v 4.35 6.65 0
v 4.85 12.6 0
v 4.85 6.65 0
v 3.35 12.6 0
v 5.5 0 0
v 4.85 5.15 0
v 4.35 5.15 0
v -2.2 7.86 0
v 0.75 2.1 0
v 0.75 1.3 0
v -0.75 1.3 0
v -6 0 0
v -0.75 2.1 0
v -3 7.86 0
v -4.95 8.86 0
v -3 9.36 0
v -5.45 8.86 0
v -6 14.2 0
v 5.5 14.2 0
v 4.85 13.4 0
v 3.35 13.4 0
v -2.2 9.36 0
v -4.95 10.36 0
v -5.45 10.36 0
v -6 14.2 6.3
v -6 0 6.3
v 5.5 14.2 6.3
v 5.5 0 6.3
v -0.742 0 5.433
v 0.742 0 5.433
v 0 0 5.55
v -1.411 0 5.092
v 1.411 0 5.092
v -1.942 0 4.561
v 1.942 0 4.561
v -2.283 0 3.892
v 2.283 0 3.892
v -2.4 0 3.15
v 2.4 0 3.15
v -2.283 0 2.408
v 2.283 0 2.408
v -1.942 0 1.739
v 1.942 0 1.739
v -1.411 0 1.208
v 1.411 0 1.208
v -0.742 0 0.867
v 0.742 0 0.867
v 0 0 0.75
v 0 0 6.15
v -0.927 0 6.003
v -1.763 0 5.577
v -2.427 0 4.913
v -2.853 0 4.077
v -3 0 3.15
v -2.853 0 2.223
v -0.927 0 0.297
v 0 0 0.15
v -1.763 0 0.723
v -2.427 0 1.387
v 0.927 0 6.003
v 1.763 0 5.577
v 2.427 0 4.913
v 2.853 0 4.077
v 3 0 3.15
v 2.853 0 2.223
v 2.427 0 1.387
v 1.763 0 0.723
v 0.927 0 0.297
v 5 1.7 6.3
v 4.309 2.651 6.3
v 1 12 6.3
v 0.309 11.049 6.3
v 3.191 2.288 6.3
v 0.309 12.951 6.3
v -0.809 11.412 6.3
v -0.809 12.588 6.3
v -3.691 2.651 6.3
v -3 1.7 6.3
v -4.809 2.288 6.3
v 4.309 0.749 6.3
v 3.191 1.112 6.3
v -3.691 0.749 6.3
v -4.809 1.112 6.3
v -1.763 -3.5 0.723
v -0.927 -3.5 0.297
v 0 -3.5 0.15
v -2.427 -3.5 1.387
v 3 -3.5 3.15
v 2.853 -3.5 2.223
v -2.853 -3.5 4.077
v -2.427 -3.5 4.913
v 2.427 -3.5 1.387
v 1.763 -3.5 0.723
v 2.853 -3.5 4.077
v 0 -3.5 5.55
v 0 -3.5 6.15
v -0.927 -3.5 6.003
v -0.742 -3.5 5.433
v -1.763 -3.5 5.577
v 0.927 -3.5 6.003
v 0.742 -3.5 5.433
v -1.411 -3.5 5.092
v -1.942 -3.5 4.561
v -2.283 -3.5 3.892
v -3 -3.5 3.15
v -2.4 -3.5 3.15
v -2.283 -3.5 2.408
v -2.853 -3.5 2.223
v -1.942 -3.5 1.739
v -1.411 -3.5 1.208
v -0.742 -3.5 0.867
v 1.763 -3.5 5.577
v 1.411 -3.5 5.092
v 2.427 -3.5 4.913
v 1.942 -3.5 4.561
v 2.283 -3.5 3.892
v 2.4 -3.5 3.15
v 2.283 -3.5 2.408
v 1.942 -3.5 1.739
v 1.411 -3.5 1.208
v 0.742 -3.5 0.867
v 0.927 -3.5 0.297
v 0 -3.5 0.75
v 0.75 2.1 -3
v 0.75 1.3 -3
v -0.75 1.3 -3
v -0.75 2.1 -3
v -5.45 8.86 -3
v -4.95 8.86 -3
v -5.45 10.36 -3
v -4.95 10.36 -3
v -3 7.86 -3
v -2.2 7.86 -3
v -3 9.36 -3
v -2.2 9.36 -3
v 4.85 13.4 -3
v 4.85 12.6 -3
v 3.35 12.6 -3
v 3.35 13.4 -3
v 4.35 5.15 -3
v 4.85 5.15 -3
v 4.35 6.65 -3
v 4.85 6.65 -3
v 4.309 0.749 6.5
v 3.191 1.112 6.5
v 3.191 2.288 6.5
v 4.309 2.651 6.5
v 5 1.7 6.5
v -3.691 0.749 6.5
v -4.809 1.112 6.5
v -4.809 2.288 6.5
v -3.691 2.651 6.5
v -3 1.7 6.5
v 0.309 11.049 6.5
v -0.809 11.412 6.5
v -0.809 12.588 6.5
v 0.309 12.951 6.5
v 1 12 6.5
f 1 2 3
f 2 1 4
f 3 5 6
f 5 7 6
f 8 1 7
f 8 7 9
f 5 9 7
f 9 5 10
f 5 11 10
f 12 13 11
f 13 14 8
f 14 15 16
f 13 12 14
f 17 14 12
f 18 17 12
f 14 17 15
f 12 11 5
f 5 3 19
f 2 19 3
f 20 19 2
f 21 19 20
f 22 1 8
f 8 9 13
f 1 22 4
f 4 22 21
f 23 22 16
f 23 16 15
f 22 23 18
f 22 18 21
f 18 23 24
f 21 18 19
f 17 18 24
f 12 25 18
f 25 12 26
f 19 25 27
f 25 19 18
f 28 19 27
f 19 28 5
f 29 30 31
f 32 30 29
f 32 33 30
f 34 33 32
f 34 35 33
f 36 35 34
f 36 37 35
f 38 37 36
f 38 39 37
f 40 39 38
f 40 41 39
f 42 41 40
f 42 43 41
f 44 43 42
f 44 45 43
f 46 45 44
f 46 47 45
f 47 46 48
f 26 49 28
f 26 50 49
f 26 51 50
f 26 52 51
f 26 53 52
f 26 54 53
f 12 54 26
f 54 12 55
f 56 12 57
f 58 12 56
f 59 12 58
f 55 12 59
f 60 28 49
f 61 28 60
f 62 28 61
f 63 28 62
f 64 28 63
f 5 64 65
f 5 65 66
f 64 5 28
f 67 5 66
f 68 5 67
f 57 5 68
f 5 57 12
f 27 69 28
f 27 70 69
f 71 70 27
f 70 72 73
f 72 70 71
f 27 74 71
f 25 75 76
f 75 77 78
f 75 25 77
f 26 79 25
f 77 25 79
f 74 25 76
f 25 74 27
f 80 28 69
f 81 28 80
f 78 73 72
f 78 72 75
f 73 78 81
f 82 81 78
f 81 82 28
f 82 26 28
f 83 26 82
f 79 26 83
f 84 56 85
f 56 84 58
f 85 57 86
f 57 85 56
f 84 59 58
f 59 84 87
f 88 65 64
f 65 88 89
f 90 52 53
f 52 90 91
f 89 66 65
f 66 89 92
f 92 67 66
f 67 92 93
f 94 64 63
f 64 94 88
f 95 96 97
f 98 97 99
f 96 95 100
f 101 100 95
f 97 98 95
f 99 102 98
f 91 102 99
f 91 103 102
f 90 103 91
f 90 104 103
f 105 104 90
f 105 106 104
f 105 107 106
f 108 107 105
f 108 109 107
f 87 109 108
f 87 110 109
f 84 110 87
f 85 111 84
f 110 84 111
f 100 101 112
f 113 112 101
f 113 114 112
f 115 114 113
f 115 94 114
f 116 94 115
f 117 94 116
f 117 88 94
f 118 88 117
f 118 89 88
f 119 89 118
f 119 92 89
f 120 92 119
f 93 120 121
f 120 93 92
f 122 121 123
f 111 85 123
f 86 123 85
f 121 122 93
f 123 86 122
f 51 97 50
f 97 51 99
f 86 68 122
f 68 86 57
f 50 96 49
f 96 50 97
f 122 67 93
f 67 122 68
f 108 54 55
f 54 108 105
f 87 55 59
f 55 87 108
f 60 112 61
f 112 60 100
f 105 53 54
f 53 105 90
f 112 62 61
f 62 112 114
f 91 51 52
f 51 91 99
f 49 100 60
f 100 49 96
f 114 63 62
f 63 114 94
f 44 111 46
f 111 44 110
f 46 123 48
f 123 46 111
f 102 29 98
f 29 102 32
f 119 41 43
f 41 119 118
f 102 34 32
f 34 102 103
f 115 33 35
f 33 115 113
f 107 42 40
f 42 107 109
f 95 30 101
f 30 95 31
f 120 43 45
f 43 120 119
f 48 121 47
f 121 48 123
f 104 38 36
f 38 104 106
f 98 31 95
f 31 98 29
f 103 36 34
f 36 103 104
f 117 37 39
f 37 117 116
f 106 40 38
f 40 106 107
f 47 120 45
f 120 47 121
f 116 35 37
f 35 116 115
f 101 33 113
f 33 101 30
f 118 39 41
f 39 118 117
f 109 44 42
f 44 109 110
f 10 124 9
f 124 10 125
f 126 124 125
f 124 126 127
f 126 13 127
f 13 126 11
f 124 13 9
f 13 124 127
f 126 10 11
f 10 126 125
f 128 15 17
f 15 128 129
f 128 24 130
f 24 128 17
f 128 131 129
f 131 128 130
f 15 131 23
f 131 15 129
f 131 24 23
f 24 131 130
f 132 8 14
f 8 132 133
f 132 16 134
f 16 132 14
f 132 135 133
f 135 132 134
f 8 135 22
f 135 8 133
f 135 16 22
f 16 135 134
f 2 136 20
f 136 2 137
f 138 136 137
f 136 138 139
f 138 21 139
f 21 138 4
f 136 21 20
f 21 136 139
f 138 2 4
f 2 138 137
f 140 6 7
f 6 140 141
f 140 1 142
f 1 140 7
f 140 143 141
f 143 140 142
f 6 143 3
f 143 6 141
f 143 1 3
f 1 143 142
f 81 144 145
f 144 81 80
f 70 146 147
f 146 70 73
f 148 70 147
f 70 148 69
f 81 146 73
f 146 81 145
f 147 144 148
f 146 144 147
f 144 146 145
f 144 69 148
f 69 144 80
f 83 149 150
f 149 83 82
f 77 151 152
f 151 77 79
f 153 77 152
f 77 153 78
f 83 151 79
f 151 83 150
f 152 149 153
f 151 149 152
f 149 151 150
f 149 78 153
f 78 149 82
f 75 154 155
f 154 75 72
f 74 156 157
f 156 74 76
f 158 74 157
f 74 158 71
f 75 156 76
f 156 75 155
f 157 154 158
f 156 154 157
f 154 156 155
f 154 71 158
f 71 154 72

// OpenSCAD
include <threads.scad>

body_height = 6.30;
body_width  = 11.50;
body_depth  = 14.20;

jack_center_to_body_rhs = 5.5;

jack_diameter = 6.0;
jack_length = 3.5;

pin_depth = 3.0;

plastic_top_height = 1.5;

module body()
    
    union() {
        color([0.1, 0.1, 0.1])
        linear_extrude(height=body_height-plastic_top_height, scale=1)
            square([body_width, body_depth]);
        color([0.3, 0.3, 0.3])
        translate([0,0,body_height-plastic_top_height])
            linear_extrude(height=plastic_top_height, scale=1)
                square([body_width, body_depth]);
    }
        
module thread()
    color("gray")
    rotate([0, 90, 90])
    difference() {
        //metric_thread(diameter=jack_diameter, pitch=0.5, length=jack_length, leadin=3);
        cylinder(h=jack_length, r=jack_diameter/2, $fn=20);
        translate([0,0,-0.1]) cylinder(h=jack_length*1.2, r=0.8*jack_diameter/2, $fn=20);
    }

module pin(x, y, fat, thin, angle)
    color("gray")
    translate([x,y,-pin_depth/2])
    rotate([0,0,angle])
    cube([fat, thin, pin_depth], center=true);
    
module thermal_stud(x, y)
    color("black")
    translate([x,y,0.2])
    cylinder(h=body_height, r=1);

union() {
    translate([-body_width+jack_center_to_body_rhs, 0, 0]) body();
    translate([0, -jack_length, body_height/2]) thread();
    pin(0.0, 1.7, 1.5, 0.8, 0);    //1
    pin(-5.2, 9.61, 1.5, 0.5, 90); //2
    pin(-2.6, 8.61, 1.5, 0.8, 90); //3
    pin(4.1, 13.0, 1.5, 0.8, 0);   //4
    pin(4.6, 1.7+4.2, 1.5, 0.5, 90); //5
    thermal_stud(4, 1.7);
    thermal_stud(-4, 1.7);
    thermal_stud(0, 12);
}
